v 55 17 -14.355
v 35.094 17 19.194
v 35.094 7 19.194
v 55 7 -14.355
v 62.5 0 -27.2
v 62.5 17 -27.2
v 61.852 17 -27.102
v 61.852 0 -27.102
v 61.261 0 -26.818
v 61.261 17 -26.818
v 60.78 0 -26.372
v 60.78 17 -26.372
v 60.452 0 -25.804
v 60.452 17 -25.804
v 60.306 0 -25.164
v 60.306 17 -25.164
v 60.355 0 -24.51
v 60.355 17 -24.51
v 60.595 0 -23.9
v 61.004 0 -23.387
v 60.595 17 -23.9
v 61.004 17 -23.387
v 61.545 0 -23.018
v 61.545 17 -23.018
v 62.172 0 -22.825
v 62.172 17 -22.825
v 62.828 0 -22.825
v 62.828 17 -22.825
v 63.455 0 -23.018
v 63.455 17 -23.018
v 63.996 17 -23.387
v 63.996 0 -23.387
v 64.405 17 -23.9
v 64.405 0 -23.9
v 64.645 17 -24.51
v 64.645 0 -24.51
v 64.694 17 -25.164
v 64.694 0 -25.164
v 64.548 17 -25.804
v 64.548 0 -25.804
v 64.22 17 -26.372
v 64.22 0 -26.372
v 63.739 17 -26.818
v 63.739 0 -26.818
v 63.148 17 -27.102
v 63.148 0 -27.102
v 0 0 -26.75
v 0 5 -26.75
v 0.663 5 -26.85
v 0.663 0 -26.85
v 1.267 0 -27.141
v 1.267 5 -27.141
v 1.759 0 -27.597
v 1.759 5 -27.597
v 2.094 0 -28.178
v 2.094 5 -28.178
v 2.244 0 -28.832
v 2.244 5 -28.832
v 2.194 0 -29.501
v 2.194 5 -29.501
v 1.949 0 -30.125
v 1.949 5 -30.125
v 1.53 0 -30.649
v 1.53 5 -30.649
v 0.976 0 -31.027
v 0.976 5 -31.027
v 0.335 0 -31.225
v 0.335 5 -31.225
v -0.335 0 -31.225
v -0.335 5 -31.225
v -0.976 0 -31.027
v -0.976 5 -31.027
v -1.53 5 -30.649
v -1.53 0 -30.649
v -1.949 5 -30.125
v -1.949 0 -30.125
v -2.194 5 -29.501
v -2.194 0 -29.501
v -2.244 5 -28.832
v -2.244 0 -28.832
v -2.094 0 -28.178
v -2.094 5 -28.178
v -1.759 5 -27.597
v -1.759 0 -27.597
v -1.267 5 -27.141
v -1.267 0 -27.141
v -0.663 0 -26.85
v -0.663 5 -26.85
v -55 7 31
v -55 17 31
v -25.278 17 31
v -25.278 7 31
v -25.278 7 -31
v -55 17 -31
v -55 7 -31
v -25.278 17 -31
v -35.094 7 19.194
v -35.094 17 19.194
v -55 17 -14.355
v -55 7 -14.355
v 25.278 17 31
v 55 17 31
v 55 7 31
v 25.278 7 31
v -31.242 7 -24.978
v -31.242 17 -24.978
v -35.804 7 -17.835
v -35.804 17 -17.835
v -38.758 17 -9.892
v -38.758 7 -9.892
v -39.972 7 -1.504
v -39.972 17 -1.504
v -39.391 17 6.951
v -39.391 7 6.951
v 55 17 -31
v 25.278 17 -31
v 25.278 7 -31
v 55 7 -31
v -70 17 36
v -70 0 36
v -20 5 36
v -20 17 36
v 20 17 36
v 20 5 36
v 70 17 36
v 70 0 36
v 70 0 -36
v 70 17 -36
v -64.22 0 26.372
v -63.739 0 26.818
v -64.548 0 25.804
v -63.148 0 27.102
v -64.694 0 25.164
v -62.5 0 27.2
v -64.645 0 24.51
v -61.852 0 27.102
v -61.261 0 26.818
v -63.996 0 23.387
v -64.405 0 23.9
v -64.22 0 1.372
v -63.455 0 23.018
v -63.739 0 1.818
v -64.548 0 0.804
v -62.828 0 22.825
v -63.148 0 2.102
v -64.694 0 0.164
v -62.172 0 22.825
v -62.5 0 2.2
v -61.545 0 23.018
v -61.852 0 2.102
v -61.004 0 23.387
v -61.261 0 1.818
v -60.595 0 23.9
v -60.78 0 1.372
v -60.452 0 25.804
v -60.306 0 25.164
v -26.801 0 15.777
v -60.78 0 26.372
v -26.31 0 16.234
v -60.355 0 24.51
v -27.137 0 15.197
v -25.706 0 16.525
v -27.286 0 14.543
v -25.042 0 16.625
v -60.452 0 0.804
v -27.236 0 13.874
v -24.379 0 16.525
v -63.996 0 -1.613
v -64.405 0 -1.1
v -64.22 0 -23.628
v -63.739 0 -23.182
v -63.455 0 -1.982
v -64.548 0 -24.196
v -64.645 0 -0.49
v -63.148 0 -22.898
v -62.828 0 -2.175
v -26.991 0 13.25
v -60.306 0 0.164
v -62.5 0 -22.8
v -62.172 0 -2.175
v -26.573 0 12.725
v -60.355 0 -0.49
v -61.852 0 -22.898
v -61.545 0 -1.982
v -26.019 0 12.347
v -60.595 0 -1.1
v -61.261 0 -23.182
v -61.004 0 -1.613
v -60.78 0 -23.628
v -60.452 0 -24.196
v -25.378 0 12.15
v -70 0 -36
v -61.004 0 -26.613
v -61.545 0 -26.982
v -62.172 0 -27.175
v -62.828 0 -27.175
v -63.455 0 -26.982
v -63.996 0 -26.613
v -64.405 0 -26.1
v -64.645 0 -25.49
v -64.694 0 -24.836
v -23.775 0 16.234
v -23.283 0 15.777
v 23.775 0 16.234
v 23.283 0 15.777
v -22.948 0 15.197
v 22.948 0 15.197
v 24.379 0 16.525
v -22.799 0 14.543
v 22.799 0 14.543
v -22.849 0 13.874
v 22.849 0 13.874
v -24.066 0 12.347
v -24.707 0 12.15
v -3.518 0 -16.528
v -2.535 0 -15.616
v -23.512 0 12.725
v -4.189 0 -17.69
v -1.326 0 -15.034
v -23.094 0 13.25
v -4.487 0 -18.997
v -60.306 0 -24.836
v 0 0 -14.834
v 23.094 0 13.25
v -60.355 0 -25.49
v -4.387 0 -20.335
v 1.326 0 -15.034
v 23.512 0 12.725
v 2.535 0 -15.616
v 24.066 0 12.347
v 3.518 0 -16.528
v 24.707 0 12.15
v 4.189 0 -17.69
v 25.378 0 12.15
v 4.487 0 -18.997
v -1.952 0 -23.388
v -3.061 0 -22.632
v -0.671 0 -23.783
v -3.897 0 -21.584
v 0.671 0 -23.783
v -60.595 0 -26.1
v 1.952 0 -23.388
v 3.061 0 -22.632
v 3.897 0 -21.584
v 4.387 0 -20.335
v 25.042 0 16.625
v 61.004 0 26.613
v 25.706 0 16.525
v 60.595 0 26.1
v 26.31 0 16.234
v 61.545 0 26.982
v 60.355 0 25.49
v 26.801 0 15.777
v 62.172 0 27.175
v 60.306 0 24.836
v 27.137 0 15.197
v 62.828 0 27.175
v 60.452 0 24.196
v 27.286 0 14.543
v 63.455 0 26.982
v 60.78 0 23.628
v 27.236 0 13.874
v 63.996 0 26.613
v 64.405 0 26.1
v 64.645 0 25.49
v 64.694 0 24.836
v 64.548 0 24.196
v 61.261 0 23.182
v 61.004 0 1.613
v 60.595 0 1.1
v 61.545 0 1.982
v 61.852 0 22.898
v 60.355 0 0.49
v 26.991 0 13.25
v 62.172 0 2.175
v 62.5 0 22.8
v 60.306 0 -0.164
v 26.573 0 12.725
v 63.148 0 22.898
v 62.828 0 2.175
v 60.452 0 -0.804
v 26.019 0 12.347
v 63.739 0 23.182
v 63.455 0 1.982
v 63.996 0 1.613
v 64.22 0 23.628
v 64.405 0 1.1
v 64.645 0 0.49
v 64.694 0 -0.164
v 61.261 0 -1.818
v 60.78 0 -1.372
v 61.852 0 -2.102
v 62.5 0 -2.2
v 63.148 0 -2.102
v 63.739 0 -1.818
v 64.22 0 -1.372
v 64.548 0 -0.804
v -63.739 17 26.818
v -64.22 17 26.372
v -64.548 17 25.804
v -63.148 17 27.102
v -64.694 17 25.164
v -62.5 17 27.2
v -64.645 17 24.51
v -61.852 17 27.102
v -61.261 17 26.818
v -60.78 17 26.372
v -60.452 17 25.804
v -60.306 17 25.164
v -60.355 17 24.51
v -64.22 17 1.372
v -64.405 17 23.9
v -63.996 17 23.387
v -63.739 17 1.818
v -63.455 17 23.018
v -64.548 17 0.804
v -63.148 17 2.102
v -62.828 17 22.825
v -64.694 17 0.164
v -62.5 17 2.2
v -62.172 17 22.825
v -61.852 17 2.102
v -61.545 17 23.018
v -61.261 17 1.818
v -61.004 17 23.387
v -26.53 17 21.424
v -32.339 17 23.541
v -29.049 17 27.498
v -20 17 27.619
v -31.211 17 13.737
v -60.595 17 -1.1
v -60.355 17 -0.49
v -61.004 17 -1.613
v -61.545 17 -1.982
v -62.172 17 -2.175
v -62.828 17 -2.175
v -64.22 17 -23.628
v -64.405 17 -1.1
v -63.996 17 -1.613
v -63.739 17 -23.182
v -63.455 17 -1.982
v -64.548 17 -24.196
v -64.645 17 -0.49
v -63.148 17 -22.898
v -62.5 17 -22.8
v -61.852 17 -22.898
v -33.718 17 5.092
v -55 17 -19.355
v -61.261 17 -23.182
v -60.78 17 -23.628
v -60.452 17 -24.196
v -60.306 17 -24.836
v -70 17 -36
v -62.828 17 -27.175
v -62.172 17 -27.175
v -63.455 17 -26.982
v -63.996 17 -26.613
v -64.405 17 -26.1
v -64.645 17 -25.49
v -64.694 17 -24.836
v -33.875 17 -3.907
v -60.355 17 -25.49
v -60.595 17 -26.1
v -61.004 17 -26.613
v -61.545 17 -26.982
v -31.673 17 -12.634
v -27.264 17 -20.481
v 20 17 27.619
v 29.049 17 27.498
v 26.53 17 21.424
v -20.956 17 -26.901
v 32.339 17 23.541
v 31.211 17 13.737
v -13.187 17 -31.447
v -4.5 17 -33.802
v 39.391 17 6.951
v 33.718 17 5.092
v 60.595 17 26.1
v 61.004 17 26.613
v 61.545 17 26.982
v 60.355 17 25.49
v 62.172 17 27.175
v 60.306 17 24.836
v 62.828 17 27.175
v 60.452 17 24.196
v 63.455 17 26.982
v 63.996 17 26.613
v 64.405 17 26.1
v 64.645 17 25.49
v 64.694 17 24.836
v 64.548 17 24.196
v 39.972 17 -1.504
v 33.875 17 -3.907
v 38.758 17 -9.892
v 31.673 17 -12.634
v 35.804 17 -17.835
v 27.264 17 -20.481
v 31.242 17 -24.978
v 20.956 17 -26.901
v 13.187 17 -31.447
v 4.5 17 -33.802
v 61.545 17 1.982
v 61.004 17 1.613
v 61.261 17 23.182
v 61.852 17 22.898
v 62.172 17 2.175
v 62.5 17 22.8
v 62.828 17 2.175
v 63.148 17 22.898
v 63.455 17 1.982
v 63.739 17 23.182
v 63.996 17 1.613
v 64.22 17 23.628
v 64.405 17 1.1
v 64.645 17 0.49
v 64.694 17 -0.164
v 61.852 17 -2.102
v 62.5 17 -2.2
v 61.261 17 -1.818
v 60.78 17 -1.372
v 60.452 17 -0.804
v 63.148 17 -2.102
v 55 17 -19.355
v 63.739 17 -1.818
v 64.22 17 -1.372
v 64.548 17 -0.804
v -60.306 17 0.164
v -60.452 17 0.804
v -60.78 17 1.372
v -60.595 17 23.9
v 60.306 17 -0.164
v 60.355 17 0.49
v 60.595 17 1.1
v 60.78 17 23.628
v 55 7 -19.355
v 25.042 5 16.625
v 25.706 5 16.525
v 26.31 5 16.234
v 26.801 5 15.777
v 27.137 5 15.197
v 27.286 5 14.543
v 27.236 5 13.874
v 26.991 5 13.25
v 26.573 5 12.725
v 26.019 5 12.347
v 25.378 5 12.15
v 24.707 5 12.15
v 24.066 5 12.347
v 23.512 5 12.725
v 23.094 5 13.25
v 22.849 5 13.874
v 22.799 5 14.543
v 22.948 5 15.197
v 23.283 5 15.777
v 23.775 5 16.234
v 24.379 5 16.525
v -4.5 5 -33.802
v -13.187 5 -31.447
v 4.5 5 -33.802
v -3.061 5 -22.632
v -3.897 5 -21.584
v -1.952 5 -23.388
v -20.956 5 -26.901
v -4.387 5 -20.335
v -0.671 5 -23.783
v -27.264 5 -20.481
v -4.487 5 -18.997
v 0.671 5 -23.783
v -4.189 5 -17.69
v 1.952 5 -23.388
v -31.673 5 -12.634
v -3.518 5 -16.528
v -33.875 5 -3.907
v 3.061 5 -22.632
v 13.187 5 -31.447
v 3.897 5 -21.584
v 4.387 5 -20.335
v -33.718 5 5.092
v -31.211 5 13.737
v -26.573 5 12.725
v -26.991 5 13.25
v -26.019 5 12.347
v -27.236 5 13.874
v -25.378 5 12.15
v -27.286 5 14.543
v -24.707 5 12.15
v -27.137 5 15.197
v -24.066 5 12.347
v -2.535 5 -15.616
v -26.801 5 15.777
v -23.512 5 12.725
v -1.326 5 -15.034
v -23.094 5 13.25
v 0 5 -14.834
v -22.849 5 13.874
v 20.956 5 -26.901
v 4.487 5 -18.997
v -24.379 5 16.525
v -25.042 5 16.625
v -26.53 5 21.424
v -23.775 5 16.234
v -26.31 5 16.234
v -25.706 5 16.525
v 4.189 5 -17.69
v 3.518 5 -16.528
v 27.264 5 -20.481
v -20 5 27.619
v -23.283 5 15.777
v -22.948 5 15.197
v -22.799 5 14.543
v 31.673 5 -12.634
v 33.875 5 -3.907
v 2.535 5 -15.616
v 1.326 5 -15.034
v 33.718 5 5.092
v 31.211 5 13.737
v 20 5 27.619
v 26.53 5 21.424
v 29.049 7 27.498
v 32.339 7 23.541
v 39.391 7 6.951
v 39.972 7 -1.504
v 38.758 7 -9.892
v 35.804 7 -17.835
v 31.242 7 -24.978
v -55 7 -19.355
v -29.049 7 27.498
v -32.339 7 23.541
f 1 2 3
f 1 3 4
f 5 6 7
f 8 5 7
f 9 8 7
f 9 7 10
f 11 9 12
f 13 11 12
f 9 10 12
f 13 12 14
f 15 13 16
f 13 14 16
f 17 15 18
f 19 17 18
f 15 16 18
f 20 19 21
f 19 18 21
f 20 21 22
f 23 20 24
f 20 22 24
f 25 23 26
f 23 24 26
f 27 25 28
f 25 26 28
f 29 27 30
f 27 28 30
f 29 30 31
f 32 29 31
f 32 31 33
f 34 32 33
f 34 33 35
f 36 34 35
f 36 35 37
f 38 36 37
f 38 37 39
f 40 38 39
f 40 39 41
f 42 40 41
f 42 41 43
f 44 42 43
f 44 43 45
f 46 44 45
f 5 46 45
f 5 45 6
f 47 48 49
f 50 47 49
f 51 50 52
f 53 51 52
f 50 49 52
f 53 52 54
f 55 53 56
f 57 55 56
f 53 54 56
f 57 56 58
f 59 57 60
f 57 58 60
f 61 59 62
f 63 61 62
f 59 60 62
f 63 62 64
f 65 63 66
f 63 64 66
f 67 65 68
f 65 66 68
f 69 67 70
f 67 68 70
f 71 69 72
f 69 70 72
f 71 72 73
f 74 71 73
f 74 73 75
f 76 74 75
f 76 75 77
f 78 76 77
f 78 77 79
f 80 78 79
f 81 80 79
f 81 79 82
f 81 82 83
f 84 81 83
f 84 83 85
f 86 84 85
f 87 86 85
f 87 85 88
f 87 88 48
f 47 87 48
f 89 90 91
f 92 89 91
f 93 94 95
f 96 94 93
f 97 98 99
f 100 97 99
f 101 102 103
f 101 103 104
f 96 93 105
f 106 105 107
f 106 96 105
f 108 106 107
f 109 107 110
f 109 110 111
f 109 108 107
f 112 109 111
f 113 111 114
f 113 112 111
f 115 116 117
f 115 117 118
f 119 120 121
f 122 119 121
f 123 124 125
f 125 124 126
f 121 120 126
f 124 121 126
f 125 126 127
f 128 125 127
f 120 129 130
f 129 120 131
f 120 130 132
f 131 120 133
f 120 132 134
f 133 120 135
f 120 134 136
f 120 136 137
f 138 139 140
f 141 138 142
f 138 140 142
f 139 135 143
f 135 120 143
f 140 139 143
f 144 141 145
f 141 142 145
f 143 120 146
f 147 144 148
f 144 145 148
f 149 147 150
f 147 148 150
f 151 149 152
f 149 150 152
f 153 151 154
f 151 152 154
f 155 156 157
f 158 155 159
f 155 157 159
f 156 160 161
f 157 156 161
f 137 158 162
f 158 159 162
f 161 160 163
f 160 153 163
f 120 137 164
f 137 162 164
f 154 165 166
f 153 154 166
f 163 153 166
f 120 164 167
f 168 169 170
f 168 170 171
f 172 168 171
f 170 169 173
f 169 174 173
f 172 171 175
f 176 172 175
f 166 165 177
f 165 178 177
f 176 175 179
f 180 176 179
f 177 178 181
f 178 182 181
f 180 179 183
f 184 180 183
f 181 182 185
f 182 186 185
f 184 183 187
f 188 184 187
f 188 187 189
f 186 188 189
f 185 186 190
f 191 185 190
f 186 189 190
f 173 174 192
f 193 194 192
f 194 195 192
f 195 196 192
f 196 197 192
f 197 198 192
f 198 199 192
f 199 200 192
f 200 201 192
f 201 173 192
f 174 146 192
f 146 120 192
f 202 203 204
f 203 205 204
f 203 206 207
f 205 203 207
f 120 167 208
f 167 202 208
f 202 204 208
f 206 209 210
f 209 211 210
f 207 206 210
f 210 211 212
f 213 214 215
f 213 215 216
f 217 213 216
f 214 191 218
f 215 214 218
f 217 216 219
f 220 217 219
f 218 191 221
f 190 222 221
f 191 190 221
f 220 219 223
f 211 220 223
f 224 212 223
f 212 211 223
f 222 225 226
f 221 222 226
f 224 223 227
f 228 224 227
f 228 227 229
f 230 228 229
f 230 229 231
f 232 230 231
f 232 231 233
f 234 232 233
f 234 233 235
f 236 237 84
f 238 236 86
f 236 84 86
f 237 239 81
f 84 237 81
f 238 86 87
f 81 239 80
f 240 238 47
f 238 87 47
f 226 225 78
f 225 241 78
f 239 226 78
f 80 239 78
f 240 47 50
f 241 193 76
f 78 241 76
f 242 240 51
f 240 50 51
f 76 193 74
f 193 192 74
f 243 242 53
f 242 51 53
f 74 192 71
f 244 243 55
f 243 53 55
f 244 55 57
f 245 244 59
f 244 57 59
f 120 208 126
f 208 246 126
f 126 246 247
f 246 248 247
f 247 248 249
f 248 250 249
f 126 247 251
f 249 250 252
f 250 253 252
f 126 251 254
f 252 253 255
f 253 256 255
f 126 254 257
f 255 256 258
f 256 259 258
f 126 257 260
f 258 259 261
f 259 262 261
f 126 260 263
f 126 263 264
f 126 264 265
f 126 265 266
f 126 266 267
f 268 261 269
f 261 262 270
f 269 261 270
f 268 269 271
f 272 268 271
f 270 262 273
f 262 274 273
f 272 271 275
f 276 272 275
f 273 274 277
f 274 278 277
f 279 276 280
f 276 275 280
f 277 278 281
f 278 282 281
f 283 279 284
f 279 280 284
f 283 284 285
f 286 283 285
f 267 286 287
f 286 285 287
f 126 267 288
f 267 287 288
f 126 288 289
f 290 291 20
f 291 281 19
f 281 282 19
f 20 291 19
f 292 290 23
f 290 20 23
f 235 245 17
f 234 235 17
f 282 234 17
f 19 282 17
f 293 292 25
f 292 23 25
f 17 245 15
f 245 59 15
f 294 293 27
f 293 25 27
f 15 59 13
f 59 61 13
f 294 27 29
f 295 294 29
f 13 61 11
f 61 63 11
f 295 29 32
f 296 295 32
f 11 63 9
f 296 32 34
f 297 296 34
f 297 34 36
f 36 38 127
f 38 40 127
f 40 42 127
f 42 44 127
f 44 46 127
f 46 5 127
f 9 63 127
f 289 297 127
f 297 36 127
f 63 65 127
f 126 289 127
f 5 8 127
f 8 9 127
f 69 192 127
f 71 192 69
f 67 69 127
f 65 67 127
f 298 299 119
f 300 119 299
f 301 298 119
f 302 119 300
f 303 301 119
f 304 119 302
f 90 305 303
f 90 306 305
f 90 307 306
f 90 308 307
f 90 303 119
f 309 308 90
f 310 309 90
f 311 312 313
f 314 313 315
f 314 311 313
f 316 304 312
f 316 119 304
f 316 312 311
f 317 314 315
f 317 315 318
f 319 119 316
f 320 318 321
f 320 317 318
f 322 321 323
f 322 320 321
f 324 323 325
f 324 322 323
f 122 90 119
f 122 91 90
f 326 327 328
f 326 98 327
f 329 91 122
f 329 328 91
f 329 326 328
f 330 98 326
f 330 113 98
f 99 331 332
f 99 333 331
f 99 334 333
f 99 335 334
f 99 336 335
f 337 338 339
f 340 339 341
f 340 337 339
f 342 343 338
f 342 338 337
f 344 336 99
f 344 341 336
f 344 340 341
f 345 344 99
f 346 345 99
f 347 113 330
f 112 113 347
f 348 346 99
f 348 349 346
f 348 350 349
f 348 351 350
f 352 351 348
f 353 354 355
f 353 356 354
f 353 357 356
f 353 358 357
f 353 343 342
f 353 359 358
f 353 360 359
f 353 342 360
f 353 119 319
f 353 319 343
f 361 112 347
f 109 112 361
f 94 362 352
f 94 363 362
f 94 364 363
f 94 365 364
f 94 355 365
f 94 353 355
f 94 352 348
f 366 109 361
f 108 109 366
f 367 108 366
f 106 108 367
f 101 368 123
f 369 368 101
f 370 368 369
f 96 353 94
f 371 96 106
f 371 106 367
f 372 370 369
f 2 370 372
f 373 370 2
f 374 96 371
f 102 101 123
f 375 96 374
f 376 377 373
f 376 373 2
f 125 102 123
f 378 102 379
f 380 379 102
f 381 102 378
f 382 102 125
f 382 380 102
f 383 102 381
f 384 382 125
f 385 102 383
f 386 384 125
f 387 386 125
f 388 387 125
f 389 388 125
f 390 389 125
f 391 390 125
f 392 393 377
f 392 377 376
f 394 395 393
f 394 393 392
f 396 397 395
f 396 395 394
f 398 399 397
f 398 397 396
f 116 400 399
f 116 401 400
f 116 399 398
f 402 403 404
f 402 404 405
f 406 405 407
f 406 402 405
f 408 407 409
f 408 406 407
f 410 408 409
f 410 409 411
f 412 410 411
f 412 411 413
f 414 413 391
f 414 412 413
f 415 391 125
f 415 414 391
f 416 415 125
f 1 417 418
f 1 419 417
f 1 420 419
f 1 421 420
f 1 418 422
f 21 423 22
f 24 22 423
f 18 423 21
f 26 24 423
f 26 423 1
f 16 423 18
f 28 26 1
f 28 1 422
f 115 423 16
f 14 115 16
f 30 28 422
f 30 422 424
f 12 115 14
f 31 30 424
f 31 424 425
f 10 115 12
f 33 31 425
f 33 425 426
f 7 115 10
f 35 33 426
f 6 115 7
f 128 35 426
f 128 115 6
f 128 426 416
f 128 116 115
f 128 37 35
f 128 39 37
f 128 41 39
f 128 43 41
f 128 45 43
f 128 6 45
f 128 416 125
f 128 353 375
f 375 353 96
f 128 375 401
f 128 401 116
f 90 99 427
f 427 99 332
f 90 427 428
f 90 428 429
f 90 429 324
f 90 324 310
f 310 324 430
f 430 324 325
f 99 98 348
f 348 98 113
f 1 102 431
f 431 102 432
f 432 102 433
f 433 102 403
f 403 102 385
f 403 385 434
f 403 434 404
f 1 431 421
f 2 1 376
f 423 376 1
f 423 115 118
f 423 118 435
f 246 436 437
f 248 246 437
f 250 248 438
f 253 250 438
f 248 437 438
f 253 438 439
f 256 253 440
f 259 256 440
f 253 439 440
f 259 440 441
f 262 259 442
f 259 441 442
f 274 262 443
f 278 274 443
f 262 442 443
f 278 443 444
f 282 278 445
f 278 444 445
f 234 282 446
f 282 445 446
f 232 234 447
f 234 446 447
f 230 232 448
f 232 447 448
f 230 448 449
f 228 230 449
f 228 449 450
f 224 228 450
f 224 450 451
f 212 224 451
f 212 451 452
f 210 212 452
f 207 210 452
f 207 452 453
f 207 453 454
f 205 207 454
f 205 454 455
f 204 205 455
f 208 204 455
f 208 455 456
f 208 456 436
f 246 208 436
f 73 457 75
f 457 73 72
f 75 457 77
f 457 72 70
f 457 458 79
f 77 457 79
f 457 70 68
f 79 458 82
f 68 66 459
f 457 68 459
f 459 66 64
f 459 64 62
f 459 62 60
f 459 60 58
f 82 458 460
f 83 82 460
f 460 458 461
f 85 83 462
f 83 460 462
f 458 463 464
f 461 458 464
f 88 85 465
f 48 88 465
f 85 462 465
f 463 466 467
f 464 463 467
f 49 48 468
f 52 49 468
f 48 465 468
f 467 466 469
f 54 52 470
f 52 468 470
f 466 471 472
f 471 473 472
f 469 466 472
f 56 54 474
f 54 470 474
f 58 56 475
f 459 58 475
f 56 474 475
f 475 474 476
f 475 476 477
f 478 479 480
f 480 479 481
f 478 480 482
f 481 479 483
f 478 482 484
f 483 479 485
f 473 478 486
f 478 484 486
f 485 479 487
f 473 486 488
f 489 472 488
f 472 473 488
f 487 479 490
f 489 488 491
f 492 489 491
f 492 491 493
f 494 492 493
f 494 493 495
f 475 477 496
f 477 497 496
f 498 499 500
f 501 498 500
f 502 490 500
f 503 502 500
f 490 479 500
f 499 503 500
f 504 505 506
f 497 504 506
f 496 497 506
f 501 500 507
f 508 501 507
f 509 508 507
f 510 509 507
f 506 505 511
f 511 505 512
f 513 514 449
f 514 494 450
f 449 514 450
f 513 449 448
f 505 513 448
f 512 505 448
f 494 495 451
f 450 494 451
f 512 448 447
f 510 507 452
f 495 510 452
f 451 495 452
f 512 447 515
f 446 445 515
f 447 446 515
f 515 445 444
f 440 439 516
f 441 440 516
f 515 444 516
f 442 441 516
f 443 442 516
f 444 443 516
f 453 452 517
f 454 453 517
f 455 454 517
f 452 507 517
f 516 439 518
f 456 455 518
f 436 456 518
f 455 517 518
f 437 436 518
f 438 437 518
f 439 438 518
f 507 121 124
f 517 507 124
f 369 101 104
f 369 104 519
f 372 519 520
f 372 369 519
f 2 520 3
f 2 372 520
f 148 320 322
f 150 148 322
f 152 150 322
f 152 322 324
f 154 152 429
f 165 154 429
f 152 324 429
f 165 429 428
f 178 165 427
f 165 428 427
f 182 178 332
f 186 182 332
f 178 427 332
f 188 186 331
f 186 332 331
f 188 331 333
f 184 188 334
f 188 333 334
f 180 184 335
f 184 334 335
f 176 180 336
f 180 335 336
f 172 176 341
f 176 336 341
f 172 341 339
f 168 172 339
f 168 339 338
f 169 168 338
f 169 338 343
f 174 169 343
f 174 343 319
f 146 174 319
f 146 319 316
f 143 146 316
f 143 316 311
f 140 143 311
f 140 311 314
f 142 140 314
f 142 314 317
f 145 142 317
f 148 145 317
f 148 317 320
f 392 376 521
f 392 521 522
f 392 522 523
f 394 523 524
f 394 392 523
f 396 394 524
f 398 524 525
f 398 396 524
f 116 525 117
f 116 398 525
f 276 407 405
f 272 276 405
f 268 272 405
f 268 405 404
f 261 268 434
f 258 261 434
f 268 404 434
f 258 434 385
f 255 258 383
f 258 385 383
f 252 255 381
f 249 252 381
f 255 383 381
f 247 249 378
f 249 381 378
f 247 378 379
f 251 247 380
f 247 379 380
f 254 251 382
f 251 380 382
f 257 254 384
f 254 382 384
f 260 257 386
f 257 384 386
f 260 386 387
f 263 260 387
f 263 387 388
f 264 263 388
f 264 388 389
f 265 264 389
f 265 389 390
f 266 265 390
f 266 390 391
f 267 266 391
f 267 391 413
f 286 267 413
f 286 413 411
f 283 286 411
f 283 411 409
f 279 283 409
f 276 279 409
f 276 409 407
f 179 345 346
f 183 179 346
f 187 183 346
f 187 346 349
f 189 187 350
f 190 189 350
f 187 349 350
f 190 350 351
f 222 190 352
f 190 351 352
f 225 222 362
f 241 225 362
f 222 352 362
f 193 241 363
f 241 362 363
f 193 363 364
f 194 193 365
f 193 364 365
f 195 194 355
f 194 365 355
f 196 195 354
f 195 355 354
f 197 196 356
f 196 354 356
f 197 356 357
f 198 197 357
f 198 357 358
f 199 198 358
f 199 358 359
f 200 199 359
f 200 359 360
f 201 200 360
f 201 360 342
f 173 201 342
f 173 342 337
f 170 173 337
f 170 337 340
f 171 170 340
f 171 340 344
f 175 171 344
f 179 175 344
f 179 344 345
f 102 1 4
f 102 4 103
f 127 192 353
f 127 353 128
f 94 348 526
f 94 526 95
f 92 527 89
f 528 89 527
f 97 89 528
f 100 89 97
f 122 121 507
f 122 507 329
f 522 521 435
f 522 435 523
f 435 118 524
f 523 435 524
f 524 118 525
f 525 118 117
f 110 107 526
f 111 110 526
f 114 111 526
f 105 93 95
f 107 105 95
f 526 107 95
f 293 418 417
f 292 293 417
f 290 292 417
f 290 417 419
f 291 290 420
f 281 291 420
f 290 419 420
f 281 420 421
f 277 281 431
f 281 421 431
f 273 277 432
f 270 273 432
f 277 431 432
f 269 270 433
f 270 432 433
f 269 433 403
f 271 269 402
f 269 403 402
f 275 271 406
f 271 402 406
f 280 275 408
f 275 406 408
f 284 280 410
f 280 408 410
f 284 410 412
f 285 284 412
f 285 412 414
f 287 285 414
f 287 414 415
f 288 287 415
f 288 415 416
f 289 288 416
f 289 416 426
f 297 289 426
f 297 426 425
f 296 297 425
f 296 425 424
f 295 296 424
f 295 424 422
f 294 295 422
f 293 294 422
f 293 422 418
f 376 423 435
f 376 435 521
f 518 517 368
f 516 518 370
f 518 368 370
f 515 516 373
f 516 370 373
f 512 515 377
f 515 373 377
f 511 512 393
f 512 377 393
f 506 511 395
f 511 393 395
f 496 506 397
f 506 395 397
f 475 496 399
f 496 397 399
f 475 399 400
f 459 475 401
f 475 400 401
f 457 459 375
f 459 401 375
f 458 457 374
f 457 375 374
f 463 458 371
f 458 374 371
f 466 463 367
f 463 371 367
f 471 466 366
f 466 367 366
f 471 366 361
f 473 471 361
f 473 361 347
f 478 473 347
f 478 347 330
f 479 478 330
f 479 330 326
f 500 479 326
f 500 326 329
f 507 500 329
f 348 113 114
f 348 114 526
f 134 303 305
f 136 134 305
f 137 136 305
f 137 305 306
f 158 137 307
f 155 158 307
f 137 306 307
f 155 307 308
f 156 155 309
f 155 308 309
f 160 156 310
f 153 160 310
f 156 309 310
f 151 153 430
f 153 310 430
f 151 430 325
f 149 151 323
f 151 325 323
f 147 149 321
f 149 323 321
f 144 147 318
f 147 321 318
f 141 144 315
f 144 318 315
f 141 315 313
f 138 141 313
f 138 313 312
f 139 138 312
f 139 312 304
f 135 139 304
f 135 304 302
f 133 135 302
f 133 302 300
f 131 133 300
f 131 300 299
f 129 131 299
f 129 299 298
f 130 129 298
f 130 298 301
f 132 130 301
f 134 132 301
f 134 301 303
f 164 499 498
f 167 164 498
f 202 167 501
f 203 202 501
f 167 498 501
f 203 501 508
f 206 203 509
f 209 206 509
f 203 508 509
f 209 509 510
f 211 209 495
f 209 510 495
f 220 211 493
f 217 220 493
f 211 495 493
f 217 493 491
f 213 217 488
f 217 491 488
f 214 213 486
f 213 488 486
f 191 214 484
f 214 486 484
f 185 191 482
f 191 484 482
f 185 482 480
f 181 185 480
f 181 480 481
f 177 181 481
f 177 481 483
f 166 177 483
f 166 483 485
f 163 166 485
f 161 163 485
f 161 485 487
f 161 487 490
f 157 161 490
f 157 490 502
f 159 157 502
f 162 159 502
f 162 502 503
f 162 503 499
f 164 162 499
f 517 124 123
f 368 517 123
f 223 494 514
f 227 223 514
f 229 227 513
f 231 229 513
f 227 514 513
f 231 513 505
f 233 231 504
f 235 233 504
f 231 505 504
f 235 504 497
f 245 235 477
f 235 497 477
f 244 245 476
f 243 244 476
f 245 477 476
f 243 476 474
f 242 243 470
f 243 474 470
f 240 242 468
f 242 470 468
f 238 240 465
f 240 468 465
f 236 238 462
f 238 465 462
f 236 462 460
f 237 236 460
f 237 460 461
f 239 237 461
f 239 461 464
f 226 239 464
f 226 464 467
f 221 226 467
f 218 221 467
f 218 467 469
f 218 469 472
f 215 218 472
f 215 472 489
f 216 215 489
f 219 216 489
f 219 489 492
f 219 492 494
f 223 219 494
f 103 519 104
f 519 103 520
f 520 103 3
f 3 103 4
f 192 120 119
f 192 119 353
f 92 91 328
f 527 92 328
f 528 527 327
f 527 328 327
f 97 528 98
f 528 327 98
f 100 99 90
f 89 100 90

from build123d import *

# Parameters (mm, degrees)
SKETCH1_W           = 140
SKETCH1_H           = 72
BOSS_EXTRUDE1_DEPTH = 17
SKETCH2_R           = 34.1
CUT_EXTRUDE1_DEPTH  = 12
SKETCH3_W           = 40
SKETCH3_H           = 24
CUT_EXTRUDE2_DEPTH  = 10
SKETCH4_R           = 2.2
CUT_EXTRUDE3_DEPTH  = 81.529497701
SKETCH5_R           = 2.25
SKETCH5_R_2         = 4.5
CUT_EXTRUDE4_DEPTH  = 80.62411695
CUT_EXTRUDE5_DEPTH  = 10


with BuildPart() as part:
    # Sketch1 → Boss-Extrude1 (new body)
    with BuildSketch(Plane(origin=(0, 0, 0), x_dir=(1, 0, 0), z_dir=(0, 1, 0))):
        Rectangle(SKETCH1_W, SKETCH1_H)
    extrude(amount=BOSS_EXTRUDE1_DEPTH)

    # Sketch2 → Cut-Extrude1 (cut)
    with BuildSketch(Plane(origin=(0, 17, 0), x_dir=(1, 0, 0), z_dir=(0, 1, 0))):
        with Locations(Location((0, 0, 0), (0, 0, 270))):
            Circle(SKETCH2_R)
    extrude(amount=-CUT_EXTRUDE1_DEPTH, mode=Mode.SUBTRACT)

    # Sketch3 → Cut-Extrude2 (cut)
    with BuildSketch(Plane.XY.offset(36)):
        with Locations((0, 17)):
            Rectangle(SKETCH3_W, SKETCH3_H)
    extrude(amount=-CUT_EXTRUDE2_DEPTH, mode=Mode.SUBTRACT)

    # Sketch4 → Cut-Extrude3 (cut, through all)
    with BuildSketch(Plane(origin=(0, 17, 0), x_dir=(1, 0, 0), z_dir=(0, 1, 0))):
        with Locations(Location((-62.5, 25, 0), (0, 0, 270))):
            Circle(SKETCH4_R)
        with Locations(Location((-62.5, 0, 0), (0, 0, 270))):
            Circle(SKETCH4_R)
        with Locations(Location((-62.5, -25, 0), (0, 0, 270))):
            Circle(SKETCH4_R)
        with Locations(Location((62.5, -25, 0), (0, 0, 90))):
            Circle(SKETCH4_R)
        with Locations(Location((62.5, 0, 0), (0, 0, 90))):
            Circle(SKETCH4_R)
        with Locations(Location((62.5, 25, 0), (0, 0, 90))):
            Circle(SKETCH4_R)
    extrude(amount=-CUT_EXTRUDE3_DEPTH, mode=Mode.SUBTRACT)

    # Sketch5 → Cut-Extrude4 (cut, through all)
    with BuildSketch(Plane(origin=(0, 5, 0), x_dir=(1, 0, 0), z_dir=(0, 1, 0))):
        with Locations(Location((0, 29, 0), (0, 0, 270))):
            Circle(SKETCH5_R)
        with Locations(Location((25.042343364, -14.374611046, 0), (0, 0, 270))):
            Circle(SKETCH5_R)
        with Locations(Location((-25.042343364, -14.374611046, 0), (0, 0, 270))):
            Circle(SKETCH5_R)
        with Locations(Location((0, 19.333592636, 0), (0, 0, 270))):
            Circle(SKETCH5_R_2)
    extrude(amount=-CUT_EXTRUDE4_DEPTH, mode=Mode.SUBTRACT)

    # Sketch6 → Cut-Extrude5 (cut)
    with BuildSketch(Plane(origin=(0, 17, 0), x_dir=(1, 0, 0), z_dir=(0, 1, 0))):
        with BuildLine():
            Line((-55, 31), (-25.27844932, 31))
            ThreePointArc((-25.27844932, 31), (-37.491645865, 13.941896942), (-39.391334679, -6.951456838))
            Line((-39.391334679, -6.951456838), (-55, 19.35498509))
            Line((-55, 19.35498509), (-55, 31))
        make_face()
        with BuildLine():
            Line((-55, -31), (-25.27844932, -31))
            ThreePointArc((-25.27844932, -31), (-30.757821307, -25.5725718), (-35.093761786, -19.194475343))
            Line((-35.093761786, -19.194475343), (-55, 14.35498509))
            Line((-55, 14.35498509), (-55, -31))
        make_face()
        with BuildLine():
            Line((55, -31), (25.27844932, -31))
            ThreePointArc((25.27844932, -31), (30.757821307, -25.5725718), (35.093761786, -19.194475343))
            Line((35.093761786, -19.194475343), (55, 14.35498509))
            Line((55, 14.35498509), (55, -31))
        make_face()
        with BuildLine():
            Line((55, 31), (55, 19.35498509))
            Line((55, 19.35498509), (39.391334679, -6.951456838))
            ThreePointArc((39.391334679, -6.951456838), (37.491645865, 13.941896942), (25.27844932, 31))
            Line((25.27844932, 31), (55, 31))
        make_face()
    extrude(amount=-CUT_EXTRUDE5_DEPTH, mode=Mode.SUBTRACT)


solid = part.part
